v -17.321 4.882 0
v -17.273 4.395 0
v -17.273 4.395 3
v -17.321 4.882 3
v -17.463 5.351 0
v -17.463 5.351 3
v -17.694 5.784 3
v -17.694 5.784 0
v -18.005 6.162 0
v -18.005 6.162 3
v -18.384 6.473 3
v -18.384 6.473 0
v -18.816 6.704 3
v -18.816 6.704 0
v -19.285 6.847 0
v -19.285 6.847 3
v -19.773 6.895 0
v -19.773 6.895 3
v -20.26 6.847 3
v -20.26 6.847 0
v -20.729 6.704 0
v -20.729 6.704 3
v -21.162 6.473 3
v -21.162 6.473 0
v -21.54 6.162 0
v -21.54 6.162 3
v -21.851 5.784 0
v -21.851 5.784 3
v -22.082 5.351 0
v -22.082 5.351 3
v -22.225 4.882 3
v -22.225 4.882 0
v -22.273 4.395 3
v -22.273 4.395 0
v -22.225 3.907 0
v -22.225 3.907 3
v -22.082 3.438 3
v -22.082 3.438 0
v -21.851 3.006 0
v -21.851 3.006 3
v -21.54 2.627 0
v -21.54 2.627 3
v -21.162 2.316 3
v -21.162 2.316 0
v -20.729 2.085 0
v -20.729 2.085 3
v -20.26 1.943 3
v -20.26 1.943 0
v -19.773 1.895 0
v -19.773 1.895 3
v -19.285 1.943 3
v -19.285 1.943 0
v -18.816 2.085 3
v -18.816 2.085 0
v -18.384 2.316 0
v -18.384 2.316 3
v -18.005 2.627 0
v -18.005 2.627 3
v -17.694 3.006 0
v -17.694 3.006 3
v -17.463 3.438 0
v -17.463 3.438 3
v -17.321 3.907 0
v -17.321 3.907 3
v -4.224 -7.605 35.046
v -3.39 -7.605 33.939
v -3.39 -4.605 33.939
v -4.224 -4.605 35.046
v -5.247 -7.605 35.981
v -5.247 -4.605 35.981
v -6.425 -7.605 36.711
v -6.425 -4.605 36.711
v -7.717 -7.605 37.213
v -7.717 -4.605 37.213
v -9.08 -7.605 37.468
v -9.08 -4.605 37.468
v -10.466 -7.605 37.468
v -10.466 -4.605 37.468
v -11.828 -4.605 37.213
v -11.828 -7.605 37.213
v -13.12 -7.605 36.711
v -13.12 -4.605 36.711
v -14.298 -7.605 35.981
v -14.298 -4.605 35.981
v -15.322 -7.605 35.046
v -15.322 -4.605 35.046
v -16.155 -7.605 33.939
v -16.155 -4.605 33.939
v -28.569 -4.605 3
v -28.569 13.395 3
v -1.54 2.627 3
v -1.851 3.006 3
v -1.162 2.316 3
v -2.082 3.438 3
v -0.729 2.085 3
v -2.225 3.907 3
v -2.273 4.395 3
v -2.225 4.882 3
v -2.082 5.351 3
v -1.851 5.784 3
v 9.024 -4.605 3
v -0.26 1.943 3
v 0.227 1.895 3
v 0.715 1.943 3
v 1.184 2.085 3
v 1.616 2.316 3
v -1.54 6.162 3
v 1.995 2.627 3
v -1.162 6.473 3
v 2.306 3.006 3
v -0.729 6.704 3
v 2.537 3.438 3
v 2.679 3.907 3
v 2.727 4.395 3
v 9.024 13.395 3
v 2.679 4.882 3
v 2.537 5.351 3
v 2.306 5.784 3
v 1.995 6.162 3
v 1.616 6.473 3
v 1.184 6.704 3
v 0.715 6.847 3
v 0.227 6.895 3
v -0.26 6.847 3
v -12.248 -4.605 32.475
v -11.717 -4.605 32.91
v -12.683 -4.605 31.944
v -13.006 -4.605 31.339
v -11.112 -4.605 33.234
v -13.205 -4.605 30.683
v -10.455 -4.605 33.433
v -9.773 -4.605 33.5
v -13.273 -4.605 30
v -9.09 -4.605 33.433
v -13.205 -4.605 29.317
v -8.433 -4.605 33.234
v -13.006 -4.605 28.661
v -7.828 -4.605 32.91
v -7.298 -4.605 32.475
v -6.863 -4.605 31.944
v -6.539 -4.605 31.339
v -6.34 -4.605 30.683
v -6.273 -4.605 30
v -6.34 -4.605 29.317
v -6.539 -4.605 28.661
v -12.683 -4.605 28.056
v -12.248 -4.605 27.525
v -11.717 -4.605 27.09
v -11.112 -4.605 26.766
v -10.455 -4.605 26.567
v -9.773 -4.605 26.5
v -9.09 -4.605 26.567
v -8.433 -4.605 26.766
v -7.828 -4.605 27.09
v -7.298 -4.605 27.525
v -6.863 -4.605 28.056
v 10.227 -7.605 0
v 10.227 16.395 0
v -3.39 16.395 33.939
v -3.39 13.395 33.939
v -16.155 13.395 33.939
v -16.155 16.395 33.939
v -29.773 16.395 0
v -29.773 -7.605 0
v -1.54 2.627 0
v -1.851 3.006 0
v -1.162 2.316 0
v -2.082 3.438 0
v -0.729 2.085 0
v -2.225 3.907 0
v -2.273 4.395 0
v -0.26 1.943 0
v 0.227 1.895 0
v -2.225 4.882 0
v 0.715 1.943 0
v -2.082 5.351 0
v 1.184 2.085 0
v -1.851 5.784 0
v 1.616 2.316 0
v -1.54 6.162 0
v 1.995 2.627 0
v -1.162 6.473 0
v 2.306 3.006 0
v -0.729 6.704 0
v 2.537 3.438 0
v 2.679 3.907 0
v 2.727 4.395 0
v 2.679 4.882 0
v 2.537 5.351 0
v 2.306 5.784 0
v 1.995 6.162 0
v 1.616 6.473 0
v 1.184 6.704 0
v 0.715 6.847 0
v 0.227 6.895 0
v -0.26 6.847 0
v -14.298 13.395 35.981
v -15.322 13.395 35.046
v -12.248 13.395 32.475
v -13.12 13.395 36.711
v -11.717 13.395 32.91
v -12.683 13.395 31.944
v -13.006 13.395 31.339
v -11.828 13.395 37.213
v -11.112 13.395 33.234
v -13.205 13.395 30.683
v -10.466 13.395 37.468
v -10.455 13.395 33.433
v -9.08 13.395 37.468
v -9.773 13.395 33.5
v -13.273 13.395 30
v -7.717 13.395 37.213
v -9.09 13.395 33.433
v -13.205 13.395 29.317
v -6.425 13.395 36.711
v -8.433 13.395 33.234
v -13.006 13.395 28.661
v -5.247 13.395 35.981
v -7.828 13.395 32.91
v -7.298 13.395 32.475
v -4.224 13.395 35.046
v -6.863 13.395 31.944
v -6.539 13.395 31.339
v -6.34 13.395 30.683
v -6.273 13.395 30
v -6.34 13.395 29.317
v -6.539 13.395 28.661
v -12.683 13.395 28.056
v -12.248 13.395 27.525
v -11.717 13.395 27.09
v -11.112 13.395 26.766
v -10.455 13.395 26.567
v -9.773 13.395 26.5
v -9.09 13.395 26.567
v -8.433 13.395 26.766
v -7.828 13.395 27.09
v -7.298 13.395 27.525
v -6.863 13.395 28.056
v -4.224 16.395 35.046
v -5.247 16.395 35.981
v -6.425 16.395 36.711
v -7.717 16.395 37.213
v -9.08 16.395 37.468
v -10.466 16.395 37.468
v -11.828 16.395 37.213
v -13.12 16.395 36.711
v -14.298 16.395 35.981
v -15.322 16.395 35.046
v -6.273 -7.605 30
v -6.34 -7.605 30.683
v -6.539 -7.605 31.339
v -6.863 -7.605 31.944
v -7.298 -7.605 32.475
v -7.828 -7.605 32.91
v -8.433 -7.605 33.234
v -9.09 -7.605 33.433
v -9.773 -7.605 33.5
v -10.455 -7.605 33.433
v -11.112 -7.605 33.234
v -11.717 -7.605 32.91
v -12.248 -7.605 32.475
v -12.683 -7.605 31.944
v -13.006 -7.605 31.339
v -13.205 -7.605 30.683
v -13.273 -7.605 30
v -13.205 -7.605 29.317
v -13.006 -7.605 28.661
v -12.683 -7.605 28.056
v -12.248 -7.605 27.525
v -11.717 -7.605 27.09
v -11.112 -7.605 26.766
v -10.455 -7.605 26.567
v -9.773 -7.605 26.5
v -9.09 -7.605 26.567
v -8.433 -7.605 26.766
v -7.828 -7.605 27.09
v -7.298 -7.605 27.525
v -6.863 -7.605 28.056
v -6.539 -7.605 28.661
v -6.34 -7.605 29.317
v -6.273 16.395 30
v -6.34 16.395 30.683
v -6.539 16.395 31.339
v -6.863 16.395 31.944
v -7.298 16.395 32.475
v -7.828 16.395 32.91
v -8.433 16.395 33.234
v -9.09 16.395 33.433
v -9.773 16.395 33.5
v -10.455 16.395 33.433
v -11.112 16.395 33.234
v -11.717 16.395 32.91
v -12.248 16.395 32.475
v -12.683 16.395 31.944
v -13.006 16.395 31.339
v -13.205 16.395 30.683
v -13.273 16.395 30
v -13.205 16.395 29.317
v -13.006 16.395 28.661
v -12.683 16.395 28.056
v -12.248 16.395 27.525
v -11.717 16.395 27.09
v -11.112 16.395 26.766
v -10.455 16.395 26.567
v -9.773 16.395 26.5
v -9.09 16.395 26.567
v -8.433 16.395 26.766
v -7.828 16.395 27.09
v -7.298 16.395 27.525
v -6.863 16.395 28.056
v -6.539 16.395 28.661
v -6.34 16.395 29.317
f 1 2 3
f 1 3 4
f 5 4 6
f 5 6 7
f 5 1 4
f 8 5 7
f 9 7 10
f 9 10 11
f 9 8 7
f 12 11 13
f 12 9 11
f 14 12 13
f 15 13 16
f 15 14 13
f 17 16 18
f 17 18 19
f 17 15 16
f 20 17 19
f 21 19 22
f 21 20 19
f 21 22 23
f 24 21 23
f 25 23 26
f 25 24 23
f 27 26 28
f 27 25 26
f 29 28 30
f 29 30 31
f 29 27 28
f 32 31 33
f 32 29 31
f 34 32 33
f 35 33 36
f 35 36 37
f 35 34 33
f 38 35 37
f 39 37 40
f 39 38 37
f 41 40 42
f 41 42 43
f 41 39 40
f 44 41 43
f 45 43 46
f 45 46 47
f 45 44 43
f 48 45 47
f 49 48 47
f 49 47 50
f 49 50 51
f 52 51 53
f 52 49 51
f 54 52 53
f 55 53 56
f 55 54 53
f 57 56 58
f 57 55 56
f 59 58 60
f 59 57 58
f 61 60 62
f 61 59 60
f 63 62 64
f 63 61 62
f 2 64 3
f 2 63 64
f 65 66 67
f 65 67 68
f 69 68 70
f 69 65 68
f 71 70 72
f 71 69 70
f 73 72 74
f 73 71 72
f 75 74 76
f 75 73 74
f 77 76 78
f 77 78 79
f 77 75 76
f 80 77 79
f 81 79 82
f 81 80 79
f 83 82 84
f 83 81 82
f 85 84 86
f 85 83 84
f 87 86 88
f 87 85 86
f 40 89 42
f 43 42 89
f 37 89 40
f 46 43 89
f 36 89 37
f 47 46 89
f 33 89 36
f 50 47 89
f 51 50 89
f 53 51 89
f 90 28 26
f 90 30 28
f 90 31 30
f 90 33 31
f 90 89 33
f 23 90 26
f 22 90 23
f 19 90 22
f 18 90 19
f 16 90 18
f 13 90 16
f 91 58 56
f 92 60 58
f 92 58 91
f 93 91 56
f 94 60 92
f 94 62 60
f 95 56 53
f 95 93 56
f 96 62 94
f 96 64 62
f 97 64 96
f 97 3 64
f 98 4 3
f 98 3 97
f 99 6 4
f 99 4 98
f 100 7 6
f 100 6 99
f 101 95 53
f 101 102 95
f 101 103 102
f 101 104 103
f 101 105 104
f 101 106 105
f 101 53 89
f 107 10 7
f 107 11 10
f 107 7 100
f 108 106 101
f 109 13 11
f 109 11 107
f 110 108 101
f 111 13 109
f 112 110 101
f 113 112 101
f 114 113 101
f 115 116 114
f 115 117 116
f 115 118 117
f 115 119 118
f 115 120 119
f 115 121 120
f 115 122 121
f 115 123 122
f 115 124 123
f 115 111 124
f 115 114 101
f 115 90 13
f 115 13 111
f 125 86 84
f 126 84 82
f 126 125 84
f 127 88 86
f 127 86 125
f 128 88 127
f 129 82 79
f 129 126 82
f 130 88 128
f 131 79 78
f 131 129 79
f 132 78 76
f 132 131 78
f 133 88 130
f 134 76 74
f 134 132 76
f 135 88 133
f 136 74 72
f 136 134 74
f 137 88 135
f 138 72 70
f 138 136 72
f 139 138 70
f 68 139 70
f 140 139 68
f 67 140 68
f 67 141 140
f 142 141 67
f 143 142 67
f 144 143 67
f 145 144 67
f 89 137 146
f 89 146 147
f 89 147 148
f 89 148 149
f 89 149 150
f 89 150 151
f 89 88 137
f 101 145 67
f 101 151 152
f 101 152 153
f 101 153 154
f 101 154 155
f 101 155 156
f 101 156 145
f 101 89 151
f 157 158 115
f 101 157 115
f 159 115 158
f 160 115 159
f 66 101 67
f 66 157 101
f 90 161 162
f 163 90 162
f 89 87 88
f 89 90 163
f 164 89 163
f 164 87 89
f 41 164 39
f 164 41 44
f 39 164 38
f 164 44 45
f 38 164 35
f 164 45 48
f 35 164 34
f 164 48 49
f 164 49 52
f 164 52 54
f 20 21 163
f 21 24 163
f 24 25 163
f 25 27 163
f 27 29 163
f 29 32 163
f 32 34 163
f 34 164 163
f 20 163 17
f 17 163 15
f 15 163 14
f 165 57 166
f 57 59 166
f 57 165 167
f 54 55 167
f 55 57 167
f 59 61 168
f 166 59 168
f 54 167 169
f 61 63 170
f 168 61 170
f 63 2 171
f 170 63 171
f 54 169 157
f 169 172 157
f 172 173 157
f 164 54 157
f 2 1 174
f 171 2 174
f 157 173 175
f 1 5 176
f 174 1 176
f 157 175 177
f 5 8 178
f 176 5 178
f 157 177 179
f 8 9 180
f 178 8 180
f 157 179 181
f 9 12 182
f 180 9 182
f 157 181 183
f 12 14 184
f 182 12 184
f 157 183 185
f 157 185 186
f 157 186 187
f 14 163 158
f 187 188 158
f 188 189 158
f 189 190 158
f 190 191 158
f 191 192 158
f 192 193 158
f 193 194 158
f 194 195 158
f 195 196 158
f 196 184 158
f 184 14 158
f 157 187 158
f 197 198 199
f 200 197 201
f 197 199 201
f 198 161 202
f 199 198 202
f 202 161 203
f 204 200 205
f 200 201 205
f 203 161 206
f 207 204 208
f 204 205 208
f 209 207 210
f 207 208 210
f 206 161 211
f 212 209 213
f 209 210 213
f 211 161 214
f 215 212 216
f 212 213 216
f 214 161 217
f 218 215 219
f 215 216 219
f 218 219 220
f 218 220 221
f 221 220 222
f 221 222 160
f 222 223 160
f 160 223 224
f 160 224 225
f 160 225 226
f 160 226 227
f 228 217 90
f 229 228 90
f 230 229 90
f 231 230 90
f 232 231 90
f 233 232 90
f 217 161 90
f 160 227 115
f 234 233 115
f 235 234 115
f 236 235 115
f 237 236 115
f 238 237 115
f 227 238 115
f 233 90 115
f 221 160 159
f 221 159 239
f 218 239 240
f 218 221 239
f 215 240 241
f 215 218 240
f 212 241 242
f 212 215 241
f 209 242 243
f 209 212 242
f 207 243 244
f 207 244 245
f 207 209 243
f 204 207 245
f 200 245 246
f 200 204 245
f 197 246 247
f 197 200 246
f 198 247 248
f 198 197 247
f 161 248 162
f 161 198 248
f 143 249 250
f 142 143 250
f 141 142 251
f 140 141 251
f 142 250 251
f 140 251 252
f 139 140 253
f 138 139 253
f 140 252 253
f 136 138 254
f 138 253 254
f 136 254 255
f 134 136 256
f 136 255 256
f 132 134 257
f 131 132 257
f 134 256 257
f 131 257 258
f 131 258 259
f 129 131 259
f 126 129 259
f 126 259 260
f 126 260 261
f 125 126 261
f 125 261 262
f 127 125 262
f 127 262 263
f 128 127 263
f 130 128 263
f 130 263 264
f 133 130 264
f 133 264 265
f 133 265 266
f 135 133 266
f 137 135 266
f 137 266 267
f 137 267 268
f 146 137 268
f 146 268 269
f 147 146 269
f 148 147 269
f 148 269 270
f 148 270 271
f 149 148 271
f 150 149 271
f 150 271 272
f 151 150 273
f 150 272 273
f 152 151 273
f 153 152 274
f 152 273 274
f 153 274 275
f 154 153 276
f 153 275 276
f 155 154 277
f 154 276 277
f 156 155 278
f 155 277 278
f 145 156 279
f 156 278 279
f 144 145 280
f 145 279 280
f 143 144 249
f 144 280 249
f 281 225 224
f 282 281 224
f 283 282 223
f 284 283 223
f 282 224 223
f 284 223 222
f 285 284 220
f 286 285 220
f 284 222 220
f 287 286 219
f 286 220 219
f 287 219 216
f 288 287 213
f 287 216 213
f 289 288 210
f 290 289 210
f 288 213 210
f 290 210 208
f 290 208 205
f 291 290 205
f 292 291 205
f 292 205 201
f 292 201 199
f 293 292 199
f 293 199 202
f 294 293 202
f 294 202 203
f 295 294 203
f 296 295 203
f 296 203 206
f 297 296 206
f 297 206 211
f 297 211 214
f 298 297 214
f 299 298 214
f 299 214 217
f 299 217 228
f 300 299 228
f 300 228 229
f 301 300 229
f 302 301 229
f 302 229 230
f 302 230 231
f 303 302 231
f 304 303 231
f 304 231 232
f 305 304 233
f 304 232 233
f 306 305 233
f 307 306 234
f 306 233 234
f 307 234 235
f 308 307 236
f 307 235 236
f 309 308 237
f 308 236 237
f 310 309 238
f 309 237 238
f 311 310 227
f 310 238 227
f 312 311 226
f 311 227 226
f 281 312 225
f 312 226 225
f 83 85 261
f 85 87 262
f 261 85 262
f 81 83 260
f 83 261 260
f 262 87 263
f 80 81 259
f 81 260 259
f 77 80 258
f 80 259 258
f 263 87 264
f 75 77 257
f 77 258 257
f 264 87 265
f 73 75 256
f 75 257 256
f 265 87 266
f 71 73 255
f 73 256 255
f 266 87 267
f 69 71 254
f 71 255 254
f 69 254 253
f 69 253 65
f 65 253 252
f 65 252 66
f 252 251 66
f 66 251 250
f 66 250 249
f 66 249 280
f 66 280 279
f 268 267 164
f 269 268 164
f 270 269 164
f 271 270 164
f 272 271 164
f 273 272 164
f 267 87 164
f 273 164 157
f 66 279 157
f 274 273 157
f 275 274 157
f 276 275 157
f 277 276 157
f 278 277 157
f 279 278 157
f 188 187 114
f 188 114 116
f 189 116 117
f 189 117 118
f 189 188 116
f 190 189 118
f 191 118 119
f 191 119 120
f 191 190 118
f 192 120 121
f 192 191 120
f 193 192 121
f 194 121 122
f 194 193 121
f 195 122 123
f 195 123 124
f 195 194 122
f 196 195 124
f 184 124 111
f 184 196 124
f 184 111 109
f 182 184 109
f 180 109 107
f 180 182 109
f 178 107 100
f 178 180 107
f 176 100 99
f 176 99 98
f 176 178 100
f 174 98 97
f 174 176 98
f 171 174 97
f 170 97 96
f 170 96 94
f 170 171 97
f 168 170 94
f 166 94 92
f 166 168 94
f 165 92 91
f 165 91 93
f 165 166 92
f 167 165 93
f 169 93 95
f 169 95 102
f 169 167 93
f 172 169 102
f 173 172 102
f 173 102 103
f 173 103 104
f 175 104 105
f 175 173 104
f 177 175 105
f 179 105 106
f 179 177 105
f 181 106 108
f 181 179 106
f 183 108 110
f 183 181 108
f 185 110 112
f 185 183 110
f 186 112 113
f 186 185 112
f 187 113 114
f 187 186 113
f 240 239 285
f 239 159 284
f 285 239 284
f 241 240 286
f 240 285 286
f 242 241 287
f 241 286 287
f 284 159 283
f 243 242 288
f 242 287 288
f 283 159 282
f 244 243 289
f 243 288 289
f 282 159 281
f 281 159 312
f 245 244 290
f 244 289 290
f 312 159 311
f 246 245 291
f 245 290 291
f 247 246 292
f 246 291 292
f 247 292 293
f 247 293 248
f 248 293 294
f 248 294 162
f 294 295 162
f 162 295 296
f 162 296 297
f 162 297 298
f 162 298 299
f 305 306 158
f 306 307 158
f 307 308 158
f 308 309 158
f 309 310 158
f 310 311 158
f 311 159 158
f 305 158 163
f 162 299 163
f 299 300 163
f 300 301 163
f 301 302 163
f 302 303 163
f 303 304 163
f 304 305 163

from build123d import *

# Parameters (mm, degrees)
SKETCH_1_R          = 2.5
EXTRUDE_1_DEPTH     = 3
SKETCH_2_W          = 40
SKETCH_2_H          = 3
EXTRUDE_2_DEPTH     = 40
SKETCH_3_R          = 3.5
CUT_EXTRUDE_1_DEPTH = 40


with BuildPart() as part:
    # 草图1 → 凸台-拉伸1 (new body)
    with BuildSketch(Plane.XY):
        Polygon((-29.772681171, 16.394648222), (-29.772681171, -7.605351778), (0.227318829, -7.605351778), (10.227318829, -7.605351778), (10.227318829, 16.394648222), align=None)
        with Locations((-19.772681171, 4.394648222)):
            Circle(SKETCH_1_R, mode=Mode.SUBTRACT)
        with Locations((0.227318829, 4.394648222)):
            Circle(SKETCH_1_R, mode=Mode.SUBTRACT)
    extrude(amount=EXTRUDE_1_DEPTH)

    # 草图2 → 凸台-拉伸2 (add)
    with BuildSketch(Plane.XY.offset(3)):
        with Locations((-9.772681171, -6.105351778)):
            Rectangle(SKETCH_2_W, SKETCH_2_H)
        with Locations((-9.772681171, 14.894648222)):
            Rectangle(SKETCH_2_W, SKETCH_2_H)
    extrude(amount=EXTRUDE_2_DEPTH)

    # 草图3 → 切除-拉伸1 (cut)
    with BuildSketch(Plane.XZ.offset(7.605351778)):
        with Locations((-9.772681171, 30)):
            Circle(SKETCH_3_R)
        with BuildLine():
            Line((-29.772681171, 0), (-66.242845542, 33.938537382))
            Line((-66.242845542, 33.938537382), (4.749976108, 60.991202945))
            Line((4.749976108, 60.991202945), (36.387923144, 40.281675758))
            Line((36.387923144, 40.281675758), (10.227318829, 0))
            Line((10.227318829, 0), (-3.390054495, 33.938537382))
            ThreePointArc((-3.390054495, 33.938537382), (-9.772681171, 37.5), (-16.155307848, 33.938537382))
            Line((-16.155307848, 33.938537382), (-29.772681171, 0))
        make_face()
    extrude(amount=-CUT_EXTRUDE_1_DEPTH, mode=Mode.SUBTRACT)


solid = part.part
